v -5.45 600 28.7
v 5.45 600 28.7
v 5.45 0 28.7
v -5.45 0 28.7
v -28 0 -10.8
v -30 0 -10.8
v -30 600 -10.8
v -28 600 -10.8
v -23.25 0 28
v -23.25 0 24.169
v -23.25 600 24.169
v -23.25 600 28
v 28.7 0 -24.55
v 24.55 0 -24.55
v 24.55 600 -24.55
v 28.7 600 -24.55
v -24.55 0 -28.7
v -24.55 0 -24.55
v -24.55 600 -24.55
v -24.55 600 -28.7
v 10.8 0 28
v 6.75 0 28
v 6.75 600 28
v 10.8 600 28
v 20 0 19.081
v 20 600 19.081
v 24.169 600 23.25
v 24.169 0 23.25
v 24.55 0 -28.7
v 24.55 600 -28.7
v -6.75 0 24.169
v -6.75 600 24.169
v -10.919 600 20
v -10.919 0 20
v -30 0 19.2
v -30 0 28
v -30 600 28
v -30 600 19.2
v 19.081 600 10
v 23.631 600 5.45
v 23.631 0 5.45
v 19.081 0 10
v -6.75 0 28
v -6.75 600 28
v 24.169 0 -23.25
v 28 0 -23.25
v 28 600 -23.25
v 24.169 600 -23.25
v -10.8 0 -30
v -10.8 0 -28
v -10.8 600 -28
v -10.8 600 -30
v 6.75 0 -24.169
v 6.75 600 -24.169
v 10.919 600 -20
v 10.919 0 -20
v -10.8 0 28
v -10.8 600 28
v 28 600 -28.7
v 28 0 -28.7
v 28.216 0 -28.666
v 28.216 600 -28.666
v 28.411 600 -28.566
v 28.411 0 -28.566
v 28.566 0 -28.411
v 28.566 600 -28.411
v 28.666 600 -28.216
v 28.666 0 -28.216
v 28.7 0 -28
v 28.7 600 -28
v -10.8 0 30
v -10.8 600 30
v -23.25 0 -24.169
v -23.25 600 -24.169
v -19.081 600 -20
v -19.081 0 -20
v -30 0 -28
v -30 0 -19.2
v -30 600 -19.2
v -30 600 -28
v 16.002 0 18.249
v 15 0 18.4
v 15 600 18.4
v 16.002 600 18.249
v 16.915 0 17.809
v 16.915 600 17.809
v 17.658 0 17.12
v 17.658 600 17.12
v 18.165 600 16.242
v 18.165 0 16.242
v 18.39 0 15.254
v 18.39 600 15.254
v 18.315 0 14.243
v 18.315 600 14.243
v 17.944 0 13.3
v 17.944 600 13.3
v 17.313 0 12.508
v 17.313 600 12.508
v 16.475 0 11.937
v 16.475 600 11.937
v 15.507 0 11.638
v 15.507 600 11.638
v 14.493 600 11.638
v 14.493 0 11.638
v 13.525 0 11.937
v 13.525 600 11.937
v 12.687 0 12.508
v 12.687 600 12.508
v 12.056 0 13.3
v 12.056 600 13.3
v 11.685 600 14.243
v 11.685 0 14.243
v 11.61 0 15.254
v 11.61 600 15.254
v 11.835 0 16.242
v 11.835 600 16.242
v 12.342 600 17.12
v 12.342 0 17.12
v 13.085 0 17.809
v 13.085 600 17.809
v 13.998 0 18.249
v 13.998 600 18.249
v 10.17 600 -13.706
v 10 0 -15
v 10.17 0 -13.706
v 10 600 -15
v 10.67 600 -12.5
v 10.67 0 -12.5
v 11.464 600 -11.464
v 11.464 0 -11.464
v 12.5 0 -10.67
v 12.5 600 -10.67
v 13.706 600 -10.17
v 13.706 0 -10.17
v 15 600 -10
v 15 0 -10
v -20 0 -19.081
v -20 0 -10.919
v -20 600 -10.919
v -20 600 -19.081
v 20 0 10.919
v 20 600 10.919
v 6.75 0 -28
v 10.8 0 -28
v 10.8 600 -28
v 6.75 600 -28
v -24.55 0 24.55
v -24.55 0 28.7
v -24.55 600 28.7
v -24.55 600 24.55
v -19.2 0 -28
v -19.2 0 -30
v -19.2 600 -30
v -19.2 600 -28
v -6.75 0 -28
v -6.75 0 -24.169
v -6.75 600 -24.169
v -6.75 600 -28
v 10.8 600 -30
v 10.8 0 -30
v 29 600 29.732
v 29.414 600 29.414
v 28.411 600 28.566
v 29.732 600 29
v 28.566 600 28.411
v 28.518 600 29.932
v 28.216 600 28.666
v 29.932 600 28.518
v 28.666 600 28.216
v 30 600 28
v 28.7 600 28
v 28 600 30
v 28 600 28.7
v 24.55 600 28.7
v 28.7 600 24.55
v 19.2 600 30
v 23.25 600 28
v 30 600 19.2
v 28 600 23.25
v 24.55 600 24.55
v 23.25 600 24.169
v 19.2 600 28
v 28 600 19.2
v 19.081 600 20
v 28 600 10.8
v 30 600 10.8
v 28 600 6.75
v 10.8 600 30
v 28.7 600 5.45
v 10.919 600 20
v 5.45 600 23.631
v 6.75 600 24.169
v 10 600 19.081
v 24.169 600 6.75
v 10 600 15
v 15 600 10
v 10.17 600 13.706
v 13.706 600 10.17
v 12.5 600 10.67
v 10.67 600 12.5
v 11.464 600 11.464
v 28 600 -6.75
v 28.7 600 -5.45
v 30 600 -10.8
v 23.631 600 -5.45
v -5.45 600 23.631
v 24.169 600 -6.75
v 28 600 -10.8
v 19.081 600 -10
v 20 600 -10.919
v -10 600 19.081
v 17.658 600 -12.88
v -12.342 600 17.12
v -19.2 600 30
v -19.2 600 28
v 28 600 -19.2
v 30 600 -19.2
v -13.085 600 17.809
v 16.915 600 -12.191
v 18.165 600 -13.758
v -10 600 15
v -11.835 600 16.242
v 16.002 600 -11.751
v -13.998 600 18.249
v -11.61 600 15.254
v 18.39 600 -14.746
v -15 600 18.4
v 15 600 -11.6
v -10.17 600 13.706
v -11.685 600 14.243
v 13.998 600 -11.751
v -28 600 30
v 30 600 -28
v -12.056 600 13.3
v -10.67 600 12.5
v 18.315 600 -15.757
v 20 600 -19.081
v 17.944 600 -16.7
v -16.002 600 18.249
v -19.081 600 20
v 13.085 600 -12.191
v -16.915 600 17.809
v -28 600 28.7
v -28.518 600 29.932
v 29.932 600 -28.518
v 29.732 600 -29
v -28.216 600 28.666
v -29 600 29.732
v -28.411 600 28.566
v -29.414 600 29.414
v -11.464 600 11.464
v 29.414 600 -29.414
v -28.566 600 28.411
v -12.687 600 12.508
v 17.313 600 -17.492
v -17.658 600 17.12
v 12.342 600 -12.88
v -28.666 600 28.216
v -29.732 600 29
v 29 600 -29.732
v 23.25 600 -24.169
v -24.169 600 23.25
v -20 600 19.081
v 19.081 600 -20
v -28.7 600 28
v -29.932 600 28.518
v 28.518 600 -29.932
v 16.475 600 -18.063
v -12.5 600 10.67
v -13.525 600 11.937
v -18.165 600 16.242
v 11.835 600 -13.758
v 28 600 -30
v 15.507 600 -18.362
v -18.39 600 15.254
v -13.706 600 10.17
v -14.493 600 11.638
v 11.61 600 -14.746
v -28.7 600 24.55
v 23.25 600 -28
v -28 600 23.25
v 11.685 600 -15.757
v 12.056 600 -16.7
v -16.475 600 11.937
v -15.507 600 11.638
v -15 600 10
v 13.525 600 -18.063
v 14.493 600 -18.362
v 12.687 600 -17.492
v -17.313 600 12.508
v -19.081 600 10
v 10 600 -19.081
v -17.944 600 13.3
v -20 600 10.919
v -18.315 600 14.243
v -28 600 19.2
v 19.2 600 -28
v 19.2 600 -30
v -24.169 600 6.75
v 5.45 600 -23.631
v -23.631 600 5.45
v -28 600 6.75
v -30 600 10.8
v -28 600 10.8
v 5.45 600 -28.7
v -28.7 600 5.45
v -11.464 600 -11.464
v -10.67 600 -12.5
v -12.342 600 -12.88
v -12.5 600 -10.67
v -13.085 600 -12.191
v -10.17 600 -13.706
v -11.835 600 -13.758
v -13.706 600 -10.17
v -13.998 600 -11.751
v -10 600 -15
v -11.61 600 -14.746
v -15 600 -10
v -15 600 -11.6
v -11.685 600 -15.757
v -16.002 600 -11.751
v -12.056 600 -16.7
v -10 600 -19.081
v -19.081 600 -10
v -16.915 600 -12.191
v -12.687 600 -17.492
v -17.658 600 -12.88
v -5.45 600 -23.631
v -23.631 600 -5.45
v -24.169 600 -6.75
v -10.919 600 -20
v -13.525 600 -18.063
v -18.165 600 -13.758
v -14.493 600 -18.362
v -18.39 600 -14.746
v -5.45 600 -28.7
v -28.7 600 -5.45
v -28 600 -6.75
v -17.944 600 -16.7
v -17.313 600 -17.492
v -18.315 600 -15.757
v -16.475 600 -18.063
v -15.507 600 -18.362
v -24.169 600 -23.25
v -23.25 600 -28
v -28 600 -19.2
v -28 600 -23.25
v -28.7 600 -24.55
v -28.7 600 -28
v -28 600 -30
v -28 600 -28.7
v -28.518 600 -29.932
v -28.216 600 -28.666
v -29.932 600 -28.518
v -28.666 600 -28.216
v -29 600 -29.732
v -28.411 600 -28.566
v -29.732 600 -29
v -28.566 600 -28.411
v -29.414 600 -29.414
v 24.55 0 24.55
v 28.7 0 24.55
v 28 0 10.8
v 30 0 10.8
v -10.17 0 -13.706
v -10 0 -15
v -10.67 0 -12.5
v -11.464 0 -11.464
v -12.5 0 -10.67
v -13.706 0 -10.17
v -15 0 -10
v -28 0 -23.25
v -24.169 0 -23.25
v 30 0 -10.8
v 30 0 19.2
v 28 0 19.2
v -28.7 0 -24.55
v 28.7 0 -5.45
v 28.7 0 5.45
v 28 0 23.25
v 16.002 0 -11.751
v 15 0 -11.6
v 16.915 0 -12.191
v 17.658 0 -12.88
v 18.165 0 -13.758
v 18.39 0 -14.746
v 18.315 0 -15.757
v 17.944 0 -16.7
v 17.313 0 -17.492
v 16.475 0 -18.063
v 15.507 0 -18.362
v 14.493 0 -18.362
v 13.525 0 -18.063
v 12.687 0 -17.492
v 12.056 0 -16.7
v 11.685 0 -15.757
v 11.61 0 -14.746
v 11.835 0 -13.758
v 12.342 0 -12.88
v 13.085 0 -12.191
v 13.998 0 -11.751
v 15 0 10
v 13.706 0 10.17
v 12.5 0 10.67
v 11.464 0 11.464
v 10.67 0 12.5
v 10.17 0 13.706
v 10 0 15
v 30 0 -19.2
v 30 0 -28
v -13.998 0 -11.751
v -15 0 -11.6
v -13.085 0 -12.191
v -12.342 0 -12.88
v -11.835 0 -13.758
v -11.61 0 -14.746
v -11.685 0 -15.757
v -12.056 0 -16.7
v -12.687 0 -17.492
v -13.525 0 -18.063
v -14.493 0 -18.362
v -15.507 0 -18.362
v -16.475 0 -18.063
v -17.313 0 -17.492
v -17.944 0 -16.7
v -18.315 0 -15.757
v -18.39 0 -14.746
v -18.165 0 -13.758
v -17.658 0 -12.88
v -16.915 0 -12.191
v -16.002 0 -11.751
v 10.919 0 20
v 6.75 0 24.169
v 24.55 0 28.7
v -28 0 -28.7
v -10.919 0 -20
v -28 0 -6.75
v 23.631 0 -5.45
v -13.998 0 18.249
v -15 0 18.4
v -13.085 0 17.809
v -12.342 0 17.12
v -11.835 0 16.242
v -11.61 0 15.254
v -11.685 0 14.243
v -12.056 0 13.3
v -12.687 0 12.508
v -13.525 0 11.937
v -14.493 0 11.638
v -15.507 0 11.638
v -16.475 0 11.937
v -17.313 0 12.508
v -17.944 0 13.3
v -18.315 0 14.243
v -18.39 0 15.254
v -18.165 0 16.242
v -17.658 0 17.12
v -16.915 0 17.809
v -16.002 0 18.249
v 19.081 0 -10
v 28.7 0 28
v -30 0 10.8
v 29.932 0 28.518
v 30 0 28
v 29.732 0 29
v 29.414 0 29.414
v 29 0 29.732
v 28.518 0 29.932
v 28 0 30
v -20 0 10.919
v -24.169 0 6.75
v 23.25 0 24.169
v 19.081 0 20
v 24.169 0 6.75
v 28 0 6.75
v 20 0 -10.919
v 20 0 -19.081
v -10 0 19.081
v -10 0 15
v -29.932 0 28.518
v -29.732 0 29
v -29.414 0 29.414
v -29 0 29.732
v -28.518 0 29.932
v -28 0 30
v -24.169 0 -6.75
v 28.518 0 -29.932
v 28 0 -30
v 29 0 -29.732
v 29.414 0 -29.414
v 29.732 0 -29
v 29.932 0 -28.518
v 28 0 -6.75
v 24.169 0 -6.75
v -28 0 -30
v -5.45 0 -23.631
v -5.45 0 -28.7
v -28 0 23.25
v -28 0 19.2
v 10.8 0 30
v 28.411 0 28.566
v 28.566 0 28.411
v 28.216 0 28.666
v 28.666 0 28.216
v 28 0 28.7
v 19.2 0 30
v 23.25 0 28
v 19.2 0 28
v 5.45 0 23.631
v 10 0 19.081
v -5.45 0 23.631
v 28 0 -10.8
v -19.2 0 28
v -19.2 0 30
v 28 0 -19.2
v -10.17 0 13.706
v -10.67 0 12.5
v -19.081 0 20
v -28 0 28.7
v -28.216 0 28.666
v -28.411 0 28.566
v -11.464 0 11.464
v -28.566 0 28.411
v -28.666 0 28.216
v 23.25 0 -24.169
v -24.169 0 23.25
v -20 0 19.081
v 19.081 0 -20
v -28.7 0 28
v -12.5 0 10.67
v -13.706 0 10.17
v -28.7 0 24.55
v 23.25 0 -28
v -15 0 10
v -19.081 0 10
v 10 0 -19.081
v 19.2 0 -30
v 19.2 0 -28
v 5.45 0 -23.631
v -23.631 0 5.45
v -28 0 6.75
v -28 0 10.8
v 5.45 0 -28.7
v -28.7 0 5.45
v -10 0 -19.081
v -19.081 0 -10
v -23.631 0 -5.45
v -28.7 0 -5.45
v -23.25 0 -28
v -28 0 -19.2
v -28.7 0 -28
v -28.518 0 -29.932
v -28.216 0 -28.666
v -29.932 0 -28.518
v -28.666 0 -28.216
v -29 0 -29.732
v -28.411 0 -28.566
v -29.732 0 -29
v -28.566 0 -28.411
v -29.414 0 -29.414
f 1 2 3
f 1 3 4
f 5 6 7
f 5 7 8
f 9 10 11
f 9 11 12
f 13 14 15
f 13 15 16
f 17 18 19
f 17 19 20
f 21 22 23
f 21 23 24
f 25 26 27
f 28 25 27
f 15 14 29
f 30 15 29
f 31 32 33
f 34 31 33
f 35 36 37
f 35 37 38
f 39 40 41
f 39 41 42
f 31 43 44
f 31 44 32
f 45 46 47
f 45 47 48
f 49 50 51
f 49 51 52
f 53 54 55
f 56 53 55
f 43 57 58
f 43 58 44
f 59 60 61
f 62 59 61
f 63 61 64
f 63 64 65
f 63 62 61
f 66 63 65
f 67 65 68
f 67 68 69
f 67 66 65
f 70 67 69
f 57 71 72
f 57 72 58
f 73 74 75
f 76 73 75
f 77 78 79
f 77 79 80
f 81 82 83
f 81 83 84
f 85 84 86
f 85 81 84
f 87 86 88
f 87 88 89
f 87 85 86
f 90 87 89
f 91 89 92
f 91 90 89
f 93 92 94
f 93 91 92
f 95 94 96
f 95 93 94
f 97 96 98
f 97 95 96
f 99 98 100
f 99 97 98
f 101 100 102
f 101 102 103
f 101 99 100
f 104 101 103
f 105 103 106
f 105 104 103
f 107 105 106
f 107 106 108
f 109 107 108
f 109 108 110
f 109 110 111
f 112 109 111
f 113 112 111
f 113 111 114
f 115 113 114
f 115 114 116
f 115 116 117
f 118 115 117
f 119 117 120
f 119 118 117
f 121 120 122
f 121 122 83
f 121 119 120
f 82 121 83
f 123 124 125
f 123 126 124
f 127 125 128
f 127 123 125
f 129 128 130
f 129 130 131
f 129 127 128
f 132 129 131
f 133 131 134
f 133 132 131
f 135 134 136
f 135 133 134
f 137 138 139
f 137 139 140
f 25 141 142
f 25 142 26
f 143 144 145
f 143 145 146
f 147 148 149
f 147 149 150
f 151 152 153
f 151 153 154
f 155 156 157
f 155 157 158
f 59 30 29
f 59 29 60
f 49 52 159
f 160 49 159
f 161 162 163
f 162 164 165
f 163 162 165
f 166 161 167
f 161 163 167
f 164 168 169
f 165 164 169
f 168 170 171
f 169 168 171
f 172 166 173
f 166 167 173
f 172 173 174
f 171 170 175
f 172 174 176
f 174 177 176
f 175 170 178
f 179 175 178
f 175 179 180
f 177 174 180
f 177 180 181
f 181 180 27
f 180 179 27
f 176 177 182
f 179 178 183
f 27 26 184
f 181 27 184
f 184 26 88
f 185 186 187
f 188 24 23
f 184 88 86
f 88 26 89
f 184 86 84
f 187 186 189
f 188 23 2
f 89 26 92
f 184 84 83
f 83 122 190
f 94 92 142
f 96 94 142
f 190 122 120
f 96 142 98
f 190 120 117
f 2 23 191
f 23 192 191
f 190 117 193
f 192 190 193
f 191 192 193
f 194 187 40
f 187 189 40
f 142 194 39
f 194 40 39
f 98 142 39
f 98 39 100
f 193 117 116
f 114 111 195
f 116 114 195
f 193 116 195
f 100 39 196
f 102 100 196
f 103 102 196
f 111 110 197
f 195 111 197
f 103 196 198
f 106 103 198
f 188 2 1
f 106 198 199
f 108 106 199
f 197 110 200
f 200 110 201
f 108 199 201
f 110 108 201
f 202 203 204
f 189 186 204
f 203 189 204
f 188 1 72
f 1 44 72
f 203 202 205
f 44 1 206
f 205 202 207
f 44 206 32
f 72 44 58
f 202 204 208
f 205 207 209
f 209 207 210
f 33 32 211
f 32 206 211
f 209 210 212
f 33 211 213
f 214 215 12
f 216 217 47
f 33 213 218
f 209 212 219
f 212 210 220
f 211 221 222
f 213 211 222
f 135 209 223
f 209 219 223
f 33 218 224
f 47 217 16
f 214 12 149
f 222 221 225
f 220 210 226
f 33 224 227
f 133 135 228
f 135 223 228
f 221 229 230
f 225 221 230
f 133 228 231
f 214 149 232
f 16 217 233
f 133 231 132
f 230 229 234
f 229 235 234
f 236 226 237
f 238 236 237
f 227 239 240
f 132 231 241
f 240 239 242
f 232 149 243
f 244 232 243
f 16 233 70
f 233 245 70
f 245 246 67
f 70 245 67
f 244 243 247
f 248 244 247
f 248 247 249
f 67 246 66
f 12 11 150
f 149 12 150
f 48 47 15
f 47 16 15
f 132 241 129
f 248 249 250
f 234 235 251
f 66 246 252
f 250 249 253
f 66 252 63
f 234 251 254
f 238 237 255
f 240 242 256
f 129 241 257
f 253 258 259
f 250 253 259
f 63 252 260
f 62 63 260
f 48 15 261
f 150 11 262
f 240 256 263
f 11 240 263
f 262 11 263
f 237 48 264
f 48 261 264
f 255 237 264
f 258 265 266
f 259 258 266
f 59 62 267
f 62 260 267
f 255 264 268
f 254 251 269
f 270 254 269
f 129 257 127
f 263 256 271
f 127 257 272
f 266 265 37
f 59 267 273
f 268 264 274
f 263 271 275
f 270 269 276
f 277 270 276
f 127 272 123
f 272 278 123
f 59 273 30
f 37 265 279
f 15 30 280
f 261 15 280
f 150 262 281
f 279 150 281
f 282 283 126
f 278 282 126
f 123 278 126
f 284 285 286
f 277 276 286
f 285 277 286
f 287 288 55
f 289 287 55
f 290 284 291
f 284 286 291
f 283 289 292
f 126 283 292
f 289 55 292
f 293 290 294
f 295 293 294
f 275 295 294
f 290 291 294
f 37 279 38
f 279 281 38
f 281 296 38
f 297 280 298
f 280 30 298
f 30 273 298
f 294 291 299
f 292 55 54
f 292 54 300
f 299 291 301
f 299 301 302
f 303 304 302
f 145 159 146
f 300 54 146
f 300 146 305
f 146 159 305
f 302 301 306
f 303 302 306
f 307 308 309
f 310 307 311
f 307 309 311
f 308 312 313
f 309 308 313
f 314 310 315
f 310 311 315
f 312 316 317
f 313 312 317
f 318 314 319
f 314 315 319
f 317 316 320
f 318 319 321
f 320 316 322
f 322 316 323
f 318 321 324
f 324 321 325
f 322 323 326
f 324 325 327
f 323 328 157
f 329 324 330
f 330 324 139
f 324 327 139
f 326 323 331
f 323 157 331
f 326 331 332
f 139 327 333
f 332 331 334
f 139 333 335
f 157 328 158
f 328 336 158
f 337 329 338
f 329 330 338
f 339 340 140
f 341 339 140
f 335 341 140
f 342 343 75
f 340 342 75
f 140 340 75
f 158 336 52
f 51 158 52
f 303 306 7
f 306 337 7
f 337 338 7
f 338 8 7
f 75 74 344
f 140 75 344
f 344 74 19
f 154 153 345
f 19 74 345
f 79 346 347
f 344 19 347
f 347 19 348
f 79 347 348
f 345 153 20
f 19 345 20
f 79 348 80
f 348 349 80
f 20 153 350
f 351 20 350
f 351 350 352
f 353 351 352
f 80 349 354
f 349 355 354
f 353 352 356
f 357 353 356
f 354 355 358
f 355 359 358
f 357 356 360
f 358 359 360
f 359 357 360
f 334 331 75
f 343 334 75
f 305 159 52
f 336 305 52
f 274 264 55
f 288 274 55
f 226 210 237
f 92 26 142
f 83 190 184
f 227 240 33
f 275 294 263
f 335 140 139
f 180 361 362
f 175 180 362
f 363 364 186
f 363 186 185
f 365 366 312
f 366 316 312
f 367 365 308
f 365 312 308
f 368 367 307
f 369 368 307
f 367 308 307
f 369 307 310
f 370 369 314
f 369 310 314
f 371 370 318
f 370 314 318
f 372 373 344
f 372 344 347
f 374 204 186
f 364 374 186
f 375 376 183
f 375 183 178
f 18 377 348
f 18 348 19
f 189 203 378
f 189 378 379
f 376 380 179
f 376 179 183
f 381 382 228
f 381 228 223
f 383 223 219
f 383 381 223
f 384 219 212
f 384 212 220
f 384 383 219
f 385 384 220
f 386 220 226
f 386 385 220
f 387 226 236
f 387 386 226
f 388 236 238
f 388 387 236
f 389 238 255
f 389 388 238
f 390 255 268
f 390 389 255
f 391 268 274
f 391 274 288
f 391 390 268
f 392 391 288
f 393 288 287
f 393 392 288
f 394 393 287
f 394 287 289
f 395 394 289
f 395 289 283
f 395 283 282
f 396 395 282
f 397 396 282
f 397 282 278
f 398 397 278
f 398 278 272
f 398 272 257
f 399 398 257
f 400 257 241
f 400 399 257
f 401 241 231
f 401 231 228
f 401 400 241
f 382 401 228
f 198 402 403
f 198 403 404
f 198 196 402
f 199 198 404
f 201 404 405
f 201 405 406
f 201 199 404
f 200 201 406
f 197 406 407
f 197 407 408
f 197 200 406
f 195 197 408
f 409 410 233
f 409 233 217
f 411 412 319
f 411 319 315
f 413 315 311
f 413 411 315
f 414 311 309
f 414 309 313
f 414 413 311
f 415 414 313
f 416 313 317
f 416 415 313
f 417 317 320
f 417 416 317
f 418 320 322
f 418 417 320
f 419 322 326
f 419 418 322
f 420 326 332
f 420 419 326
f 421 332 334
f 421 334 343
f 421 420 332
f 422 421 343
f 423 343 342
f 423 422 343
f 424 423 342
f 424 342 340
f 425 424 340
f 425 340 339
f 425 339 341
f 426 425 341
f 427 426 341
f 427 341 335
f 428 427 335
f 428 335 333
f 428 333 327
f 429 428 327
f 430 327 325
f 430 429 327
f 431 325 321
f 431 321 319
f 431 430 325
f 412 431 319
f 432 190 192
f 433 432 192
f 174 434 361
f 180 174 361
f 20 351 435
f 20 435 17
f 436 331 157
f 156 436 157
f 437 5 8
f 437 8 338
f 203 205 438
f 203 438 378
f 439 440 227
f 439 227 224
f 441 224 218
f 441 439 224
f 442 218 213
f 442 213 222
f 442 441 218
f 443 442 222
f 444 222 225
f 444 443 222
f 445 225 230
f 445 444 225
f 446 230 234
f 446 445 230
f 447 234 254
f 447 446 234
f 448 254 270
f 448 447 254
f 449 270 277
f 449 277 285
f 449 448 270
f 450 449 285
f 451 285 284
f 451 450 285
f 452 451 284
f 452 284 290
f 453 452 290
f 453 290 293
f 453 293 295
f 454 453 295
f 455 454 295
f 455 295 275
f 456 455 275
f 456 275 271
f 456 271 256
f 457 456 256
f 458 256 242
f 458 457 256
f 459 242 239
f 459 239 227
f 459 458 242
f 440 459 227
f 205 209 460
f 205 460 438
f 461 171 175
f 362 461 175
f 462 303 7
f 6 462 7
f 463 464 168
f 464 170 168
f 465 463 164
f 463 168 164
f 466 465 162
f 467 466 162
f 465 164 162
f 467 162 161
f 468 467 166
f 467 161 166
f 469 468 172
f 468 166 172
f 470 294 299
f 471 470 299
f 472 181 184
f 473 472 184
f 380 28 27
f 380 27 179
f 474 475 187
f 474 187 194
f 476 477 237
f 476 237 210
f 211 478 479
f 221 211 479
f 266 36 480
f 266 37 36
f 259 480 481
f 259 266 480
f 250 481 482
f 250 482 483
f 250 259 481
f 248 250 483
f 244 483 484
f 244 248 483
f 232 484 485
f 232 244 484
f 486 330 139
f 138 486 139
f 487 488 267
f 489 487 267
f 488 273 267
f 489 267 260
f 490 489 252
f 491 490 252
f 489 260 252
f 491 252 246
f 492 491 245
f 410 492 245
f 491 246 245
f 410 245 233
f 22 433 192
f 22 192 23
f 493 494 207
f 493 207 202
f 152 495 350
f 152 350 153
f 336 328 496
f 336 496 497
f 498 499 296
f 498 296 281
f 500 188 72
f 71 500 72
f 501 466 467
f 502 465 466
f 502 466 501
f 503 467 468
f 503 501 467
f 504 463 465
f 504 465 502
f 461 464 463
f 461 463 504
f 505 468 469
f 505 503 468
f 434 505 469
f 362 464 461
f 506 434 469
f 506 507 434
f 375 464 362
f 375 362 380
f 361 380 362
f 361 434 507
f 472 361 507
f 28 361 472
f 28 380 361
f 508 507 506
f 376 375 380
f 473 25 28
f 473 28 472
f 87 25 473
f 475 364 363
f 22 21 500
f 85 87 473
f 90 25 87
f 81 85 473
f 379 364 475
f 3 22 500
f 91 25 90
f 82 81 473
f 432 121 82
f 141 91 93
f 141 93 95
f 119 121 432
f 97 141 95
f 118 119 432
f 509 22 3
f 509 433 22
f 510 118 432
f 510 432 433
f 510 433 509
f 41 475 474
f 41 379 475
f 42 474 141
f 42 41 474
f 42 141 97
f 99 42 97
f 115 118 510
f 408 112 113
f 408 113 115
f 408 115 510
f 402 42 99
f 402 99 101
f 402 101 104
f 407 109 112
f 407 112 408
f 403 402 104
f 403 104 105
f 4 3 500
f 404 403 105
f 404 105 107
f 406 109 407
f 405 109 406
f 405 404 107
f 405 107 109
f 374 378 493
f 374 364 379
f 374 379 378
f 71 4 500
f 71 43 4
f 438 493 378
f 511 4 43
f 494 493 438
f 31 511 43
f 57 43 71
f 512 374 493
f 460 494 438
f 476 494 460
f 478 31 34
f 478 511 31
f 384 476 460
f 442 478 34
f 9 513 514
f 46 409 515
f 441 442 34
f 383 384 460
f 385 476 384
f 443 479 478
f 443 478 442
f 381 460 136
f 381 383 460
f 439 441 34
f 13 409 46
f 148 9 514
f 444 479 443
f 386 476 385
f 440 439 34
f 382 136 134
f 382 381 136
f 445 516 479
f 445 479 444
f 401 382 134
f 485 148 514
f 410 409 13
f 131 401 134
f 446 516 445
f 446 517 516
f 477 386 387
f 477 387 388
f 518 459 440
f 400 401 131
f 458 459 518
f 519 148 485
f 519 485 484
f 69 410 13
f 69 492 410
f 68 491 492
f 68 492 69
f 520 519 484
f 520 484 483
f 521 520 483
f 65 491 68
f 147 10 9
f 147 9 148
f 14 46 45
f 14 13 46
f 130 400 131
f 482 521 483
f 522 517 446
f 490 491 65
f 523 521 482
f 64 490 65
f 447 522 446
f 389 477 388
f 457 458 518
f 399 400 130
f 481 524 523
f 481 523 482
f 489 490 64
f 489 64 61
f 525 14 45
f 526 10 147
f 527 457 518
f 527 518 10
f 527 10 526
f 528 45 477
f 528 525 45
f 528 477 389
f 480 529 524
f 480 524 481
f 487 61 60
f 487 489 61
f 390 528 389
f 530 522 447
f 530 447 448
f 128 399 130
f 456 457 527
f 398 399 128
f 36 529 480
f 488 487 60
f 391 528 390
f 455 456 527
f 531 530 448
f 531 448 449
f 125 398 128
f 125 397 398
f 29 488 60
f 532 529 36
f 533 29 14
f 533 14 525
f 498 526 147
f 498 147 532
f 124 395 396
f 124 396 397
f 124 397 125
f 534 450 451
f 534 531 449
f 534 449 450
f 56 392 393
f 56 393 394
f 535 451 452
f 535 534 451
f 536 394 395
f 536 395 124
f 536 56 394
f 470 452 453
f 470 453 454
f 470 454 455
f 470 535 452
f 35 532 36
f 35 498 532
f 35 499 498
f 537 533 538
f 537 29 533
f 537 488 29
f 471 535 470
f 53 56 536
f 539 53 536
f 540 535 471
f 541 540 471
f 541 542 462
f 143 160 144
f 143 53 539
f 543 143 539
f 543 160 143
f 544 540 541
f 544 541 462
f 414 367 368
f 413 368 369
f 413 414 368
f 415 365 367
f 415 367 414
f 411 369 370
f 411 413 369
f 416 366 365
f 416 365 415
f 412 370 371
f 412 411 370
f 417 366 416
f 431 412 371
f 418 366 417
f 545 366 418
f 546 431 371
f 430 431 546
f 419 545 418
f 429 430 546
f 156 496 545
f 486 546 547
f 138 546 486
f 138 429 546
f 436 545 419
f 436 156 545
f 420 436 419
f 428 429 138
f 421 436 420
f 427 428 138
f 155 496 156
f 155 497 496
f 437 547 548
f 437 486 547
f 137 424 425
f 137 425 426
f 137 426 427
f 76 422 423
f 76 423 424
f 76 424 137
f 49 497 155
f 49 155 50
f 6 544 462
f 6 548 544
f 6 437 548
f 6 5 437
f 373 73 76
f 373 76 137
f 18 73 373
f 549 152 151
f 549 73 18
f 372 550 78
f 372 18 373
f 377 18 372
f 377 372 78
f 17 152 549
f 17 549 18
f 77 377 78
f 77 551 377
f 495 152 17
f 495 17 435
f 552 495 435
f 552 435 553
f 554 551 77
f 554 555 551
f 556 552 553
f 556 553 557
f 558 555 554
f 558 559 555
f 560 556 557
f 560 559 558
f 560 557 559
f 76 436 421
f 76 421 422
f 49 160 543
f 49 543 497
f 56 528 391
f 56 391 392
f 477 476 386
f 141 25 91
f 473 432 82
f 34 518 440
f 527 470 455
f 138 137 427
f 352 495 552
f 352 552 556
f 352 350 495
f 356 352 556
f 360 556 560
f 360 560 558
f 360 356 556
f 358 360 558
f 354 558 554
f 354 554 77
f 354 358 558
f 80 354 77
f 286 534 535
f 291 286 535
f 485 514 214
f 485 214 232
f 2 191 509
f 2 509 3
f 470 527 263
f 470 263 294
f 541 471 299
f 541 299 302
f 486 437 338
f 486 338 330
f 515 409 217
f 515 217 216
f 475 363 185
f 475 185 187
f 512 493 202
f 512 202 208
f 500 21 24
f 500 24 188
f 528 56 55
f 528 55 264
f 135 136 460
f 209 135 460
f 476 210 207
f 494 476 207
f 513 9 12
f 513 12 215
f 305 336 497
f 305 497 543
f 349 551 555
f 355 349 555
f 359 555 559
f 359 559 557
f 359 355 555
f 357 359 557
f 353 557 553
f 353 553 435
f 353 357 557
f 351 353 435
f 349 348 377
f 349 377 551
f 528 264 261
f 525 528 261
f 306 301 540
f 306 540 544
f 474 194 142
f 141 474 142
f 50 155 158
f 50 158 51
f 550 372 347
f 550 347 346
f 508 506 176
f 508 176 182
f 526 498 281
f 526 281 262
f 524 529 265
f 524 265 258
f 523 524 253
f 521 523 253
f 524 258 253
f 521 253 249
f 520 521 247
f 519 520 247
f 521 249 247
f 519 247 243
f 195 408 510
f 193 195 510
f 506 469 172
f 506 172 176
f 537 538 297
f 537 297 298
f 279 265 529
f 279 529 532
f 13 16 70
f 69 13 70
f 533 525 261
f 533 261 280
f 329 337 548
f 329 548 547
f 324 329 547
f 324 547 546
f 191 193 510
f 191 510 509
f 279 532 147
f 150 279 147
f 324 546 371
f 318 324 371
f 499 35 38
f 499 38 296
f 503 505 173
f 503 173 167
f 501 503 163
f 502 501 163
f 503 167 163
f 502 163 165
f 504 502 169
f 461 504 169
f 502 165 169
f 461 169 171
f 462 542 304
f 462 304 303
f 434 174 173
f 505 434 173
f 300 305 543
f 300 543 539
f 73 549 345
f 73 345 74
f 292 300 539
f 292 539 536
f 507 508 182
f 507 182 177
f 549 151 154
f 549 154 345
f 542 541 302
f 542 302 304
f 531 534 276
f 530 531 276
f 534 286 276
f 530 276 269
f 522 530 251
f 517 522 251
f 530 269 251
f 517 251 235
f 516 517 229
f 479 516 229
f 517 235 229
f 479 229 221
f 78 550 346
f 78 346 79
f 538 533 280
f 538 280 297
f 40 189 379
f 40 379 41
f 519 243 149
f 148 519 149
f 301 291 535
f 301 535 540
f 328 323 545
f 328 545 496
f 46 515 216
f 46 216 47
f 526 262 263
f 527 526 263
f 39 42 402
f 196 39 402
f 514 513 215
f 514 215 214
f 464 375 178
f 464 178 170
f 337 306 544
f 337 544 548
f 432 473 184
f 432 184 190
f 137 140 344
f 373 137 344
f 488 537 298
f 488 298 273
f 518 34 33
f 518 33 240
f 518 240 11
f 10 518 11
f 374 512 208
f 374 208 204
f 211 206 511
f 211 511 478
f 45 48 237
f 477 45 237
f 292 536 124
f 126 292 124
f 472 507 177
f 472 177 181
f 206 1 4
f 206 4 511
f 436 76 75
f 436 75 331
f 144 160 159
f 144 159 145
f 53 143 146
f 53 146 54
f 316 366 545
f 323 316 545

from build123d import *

# Parameters (mm, degrees)
SKETCH_1_R      = 3.4
SKETCH_1_W      = 4.15
SKETCH_1_H      = 4.15
EXTRUDE_1_DEPTH = 600
FILLET_1_R      = 0.7
FILLET_2_R      = 2
FILLET_3_R      = 5


with BuildPart() as part:
    # 草图1 → 凸台-拉伸1 (new body)
    with BuildSketch(Plane(origin=(0, 0, 0), x_dir=(1, 0, 0), z_dir=(0, 1, 0))):
        Polygon((-30, 30), (-19.2, 30), (-19.2, 28), (-23.25, 28), (-23.25, 24.169238816), (-19.080761184, 20), (-10.919238816, 20), (-6.75, 24.169238816), (-6.75, 28), (-10.8, 28), (-10.8, 30), (10.8, 30), (10.8, 28), (6.75, 28), (6.75, 24.169238816), (10.919238816, 20), (19.080761184, 20), (23.25, 24.169238816), (23.25, 28), (19.2, 28), (19.2, 30), (30, 30), (30, 19.2), (28, 19.2), (28, 23.25), (24.169238816, 23.25), (20, 19.080761184), (20, 10.919238816), (24.169238816, 6.75), (28, 6.75), (28, 10.8), (30, 10.8), (30, -10.8), (28, -10.8), (28, -6.75), (24.169238816, -6.75), (20, -10.919238816), (20, -19.080761184), (24.169238816, -23.25), (28, -23.25), (28, -19.2), (30, -19.2), (30, -30), (19.2, -30), (19.2, -28), (23.25, -28), (23.25, -24.169238816), (19.080761184, -20), (10.919238816, -20), (6.75, -24.169238816), (6.75, -28), (10.8, -28), (10.8, -30), (-10.8, -30), (-10.8, -28), (-6.75, -28), (-6.75, -24.169238816), (-10.919238816, -20), (-19.080761184, -20), (-23.25, -24.169238816), (-23.25, -28), (-19.2, -28), (-19.2, -30), (-30, -30), (-30, -19.2), (-28, -19.2), (-28, -23.25), (-24.169238816, -23.25), (-20, -19.080761184), (-20, -10.919238816), (-24.169238816, -6.75), (-28, -6.75), (-28, -10.8), (-30, -10.8), (-30, 10.8), (-28, 10.8), (-28, 6.75), (-24.169238816, 6.75), (-20, 10.919238816), (-20, 19.080761184), (-24.169238816, 23.25), (-28, 23.25), (-28, 19.2), (-30, 19.2), align=None)
        with Locations(Location((-15, 15, 0), (0, 0, 270))):
            Circle(SKETCH_1_R, mode=Mode.SUBTRACT)
        with Locations(Location((15, 15, 0), (0, 0, 270))):
            Circle(SKETCH_1_R, mode=Mode.SUBTRACT)
        with Locations(Location((15, -15, 0), (0, 0, 270))):
            Circle(SKETCH_1_R, mode=Mode.SUBTRACT)
        with Locations(Location((-15, -15, 0), (0, 0, 270))):
            Circle(SKETCH_1_R, mode=Mode.SUBTRACT)
        Polygon((-5.45, 28), (-5.45, 28.7), (5.45, 28.7), (5.45, 28), (5.45, 23.630761184), (10, 19.080761184), (10, 10), (19.080761184, 10), (23.630761184, 5.45), (28, 5.45), (28.7, 5.45), (28.7, -5.45), (28, -5.45), (23.630761184, -5.45), (19.080761184, -10), (10, -10), (10, -19.080761184), (5.45, -23.630761184), (5.45, -28), (5.45, -28.7), (-5.45, -28.7), (-5.45, -28), (-5.45, -23.630761184), (-10, -19.080761184), (-10, -10), (-19.080761184, -10), (-23.630761184, -5.45), (-28, -5.45), (-28.7, -5.45), (-28.7, 5.45), (-28, 5.45), (-23.630761184, 5.45), (-19.080761184, 10), (-10, 10), (-10, 19.080761184), (-5.45, 23.630761184), align=None, mode=Mode.SUBTRACT)
        with Locations((-26.625, 26.625)):
            Rectangle(SKETCH_1_W, SKETCH_1_H, mode=Mode.SUBTRACT)
        with Locations((26.625, 26.625)):
            Rectangle(SKETCH_1_W, SKETCH_1_H, mode=Mode.SUBTRACT)
        with Locations((26.625, -26.625)):
            Rectangle(SKETCH_1_W, SKETCH_1_H, mode=Mode.SUBTRACT)
        with Locations((-26.625, -26.625)):
            Rectangle(SKETCH_1_W, SKETCH_1_H, mode=Mode.SUBTRACT)
    extrude(amount=EXTRUDE_1_DEPTH)

    # 圆角1
    fillet_1_edges = [part.edges().sort_by_distance(p)[0] for p in [
        (28.7, 300, 28.7),
        (28.7, 300, -28.7),
        (-28.7, 300, -28.7),
        (-28.7, 300, 28.7),
    ]]
    fillet(fillet_1_edges, radius=FILLET_1_R)

    # 圆角2
    fillet_2_edges = [part.edges().sort_by_distance(p)[0] for p in [
        (30, 300, -30),
        (30, 300, 30),
        (-30, 300, 30),
        (-30, 300, -30),
    ]]
    fillet(fillet_2_edges, radius=FILLET_2_R)

    # 圆角3
    fillet_3_edges = [part.edges().sort_by_distance(p)[0] for p in [
        (10, 300, 10),
        (10, 300, -10),
        (-10, 300, -10),
        (-10, 300, 10),
    ]]
    fillet(fillet_3_edges, radius=FILLET_3_R)


solid = part.part
